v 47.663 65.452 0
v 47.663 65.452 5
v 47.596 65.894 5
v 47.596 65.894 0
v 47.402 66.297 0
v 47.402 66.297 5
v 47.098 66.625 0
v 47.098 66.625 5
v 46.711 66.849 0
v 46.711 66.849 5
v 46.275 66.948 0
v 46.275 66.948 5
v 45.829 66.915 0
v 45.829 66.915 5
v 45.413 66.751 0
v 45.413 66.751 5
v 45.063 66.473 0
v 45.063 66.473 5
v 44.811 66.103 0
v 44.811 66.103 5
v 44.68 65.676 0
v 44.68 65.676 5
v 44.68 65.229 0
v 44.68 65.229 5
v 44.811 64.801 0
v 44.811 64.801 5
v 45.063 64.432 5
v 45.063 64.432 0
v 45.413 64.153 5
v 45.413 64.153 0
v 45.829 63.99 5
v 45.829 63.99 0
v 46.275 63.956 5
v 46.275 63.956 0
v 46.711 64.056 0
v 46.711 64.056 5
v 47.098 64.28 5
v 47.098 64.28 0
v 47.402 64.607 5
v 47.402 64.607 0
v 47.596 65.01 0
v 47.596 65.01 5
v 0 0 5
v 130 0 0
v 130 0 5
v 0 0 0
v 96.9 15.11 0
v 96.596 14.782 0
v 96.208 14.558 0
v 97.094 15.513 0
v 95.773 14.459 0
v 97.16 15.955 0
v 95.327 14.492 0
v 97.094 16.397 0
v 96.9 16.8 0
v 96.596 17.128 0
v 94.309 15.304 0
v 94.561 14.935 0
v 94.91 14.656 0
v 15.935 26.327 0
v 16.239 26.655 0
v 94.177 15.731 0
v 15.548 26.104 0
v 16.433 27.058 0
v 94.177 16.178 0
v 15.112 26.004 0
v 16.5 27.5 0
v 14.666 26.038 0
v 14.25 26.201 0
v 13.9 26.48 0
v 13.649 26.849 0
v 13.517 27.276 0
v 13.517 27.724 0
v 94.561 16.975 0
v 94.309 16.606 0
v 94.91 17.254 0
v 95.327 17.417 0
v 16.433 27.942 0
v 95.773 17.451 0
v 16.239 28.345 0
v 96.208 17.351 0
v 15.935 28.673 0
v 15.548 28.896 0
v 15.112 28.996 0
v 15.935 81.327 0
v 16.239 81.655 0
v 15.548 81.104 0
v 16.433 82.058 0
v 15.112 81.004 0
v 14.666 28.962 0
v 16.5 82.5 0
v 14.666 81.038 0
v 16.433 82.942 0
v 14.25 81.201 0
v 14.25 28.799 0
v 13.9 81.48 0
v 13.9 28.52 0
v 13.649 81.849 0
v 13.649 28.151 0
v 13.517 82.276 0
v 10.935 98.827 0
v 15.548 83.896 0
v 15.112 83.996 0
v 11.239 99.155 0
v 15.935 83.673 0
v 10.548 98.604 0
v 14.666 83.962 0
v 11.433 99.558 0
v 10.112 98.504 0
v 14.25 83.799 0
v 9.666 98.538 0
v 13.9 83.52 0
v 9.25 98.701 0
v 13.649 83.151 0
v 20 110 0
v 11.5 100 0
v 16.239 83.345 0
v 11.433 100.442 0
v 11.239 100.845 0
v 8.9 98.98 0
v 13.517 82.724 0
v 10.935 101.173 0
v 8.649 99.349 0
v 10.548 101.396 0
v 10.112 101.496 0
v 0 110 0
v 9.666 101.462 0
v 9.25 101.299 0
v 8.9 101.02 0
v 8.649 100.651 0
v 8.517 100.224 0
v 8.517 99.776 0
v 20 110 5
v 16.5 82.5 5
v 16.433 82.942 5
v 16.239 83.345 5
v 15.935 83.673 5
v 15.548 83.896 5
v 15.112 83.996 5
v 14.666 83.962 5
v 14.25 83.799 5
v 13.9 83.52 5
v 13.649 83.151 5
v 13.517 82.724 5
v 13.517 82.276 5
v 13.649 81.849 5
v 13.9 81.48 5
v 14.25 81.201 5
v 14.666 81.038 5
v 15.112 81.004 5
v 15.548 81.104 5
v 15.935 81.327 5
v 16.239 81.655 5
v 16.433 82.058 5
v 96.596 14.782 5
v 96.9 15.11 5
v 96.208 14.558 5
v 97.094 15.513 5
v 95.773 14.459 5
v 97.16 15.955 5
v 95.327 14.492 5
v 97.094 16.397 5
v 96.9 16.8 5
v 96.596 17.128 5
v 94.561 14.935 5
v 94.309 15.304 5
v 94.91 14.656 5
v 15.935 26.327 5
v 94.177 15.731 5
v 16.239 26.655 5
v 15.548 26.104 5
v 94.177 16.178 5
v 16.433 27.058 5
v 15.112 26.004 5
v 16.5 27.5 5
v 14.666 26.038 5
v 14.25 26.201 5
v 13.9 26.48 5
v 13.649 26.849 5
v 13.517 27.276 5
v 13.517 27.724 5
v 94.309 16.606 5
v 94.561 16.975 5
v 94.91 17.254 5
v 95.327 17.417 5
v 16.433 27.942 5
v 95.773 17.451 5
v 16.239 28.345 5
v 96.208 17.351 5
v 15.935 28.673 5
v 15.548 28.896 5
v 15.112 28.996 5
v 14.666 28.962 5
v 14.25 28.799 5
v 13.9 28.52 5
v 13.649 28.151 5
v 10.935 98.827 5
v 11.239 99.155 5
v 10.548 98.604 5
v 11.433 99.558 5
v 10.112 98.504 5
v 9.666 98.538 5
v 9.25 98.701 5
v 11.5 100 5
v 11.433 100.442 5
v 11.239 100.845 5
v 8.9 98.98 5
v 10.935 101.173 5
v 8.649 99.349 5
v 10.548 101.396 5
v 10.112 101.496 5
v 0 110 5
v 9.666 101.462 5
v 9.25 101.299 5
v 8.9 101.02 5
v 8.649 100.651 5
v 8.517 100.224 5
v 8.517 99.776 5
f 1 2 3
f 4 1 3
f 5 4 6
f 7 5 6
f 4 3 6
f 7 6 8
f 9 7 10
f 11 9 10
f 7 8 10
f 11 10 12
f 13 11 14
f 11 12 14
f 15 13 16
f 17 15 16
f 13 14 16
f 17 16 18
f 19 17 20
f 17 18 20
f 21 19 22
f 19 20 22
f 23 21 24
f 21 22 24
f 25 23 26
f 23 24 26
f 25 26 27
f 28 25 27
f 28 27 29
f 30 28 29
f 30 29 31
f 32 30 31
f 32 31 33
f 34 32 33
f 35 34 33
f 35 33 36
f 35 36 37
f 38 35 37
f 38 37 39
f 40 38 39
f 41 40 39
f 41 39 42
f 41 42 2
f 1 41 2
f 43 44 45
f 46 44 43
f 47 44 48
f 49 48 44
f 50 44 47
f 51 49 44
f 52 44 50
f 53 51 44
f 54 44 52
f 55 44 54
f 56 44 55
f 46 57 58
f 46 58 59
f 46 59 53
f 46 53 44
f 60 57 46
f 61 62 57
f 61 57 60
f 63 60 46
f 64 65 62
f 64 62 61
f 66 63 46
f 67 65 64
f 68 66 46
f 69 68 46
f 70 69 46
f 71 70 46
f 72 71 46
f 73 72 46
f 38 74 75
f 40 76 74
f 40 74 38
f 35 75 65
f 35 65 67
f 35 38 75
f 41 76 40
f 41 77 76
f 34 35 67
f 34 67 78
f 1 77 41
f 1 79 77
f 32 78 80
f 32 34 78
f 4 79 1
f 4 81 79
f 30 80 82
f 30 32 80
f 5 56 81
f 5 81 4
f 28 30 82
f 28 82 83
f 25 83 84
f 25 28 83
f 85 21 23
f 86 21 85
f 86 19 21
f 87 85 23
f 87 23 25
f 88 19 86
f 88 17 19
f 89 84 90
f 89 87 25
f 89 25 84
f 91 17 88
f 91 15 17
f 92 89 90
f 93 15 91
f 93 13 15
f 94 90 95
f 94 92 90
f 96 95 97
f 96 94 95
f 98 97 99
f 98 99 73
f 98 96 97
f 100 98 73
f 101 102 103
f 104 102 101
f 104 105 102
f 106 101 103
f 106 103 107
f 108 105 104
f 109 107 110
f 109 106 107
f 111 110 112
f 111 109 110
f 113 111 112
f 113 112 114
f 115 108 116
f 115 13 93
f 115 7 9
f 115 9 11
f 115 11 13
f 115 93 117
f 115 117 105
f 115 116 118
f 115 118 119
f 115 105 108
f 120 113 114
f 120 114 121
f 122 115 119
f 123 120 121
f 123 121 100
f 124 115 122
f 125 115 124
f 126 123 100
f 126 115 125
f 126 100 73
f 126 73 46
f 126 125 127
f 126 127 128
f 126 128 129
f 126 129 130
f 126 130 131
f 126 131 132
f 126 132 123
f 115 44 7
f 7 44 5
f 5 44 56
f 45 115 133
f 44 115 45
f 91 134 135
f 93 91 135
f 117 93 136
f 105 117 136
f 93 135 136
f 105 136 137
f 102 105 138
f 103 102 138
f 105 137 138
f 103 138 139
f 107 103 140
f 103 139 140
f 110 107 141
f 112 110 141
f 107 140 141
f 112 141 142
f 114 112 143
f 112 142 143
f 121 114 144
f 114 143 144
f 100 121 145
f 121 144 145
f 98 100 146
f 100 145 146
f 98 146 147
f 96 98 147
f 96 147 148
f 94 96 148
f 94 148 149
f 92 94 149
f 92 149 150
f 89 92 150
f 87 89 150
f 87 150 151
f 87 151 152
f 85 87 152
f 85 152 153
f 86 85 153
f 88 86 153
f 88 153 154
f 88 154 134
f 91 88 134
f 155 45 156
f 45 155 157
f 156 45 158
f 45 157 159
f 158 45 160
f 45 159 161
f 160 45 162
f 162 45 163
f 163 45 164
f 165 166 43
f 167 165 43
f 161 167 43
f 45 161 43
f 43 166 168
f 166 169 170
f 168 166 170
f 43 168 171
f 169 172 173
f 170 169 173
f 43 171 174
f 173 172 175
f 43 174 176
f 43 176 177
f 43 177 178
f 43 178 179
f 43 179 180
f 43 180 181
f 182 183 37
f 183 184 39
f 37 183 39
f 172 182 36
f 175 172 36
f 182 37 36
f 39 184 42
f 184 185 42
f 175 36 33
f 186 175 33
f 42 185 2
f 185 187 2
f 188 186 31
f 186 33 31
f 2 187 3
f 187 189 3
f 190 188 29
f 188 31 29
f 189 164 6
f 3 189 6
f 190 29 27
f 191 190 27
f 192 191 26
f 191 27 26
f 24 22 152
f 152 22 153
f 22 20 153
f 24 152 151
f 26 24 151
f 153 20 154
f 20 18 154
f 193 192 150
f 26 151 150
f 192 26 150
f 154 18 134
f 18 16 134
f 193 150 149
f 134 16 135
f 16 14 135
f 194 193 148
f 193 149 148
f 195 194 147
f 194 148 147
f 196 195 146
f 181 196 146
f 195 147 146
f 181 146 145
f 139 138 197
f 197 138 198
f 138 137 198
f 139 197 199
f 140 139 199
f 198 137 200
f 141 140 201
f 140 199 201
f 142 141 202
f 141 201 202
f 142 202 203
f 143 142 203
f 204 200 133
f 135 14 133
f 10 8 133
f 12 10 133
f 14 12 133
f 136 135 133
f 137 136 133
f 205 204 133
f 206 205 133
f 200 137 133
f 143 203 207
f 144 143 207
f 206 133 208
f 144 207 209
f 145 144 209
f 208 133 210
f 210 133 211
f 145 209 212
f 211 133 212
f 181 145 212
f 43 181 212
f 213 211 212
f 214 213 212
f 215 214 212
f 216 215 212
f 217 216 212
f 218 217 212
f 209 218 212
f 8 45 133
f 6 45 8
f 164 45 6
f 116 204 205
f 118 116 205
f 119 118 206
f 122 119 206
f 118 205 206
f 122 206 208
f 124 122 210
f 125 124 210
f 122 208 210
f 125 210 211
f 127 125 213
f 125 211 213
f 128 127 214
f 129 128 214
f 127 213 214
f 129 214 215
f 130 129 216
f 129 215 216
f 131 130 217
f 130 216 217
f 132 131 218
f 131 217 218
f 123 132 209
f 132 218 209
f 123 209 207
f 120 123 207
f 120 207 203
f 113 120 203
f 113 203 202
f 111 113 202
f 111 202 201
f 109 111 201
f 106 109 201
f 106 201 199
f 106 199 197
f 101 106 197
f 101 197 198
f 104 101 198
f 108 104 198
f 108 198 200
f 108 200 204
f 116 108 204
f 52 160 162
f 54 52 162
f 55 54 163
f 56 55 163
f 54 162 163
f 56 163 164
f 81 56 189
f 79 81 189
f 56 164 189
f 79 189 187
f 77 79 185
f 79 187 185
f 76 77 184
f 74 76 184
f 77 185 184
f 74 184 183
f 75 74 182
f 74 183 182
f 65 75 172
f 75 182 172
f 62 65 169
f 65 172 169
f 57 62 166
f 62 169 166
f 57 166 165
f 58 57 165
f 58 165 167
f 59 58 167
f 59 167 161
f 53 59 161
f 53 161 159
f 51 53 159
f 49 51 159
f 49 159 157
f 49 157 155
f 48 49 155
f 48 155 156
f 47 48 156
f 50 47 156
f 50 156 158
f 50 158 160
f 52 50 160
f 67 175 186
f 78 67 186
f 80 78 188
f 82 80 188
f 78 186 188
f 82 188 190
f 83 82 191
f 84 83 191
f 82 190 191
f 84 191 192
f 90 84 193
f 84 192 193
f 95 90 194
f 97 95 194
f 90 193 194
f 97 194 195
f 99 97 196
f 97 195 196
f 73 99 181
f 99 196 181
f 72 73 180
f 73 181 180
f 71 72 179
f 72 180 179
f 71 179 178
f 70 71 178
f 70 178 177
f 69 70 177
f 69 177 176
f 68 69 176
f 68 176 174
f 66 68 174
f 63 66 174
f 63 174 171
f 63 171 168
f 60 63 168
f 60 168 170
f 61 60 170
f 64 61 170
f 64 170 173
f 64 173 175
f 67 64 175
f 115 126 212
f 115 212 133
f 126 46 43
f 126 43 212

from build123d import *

# Parameters (mm, degrees)
BOSS_EXTRUDE1_DEPTH = 5
SKETCH2_R           = 1.5
CUT_EXTRUDE1_DEPTH  = 6
SKETCH3_R           = 1.5
CUT_EXTRUDE2_DEPTH  = 6
SKETCH4_R           = 1.5
CUT_EXTRUDE3_DEPTH  = 6


with BuildPart() as part:
    # Sketch1 → Boss-Extrude1 (new body)
    with BuildSketch(Plane.XY):
        Polygon((0, 0), (0, 110), (20, 110), (130, 0), align=None)
    extrude(amount=BOSS_EXTRUDE1_DEPTH)

    # Sketch2 → Cut-Extrude1 (cut, through all)
    with BuildSketch(Plane.XY.offset(5)):
        with Locations((15, 82.5)):
            Circle(SKETCH2_R)
        with Locations((15, 27.5)):
            Circle(SKETCH2_R)
    extrude(amount=-CUT_EXTRUDE1_DEPTH, mode=Mode.SUBTRACT)

    # Sketch3 → Cut-Extrude2 (cut, through all)
    with BuildSketch(Plane.XY.offset(5)):
        with Locations((46.162950904, 65.452272785)):
            Circle(SKETCH3_R)
        with Locations((95.660425587, 15.954798102)):
            Circle(SKETCH3_R)
    extrude(amount=-CUT_EXTRUDE2_DEPTH, mode=Mode.SUBTRACT)

    # Sketch4 → Cut-Extrude3 (cut, through all)
    with BuildSketch(Plane.XY.offset(5)):
        with Locations((10, 100)):
            Circle(SKETCH4_R)
    extrude(amount=-CUT_EXTRUDE3_DEPTH, mode=Mode.SUBTRACT)


solid = part.part
